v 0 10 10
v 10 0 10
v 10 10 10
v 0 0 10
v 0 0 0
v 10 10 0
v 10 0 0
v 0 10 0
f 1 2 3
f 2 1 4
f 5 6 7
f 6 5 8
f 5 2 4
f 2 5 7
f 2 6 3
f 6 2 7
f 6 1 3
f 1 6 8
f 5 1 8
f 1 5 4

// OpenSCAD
// Mock SCAD output for <mock_solid.MockShape object at 0x7f1cfd30e9c0>
cube([10,10,10]);
